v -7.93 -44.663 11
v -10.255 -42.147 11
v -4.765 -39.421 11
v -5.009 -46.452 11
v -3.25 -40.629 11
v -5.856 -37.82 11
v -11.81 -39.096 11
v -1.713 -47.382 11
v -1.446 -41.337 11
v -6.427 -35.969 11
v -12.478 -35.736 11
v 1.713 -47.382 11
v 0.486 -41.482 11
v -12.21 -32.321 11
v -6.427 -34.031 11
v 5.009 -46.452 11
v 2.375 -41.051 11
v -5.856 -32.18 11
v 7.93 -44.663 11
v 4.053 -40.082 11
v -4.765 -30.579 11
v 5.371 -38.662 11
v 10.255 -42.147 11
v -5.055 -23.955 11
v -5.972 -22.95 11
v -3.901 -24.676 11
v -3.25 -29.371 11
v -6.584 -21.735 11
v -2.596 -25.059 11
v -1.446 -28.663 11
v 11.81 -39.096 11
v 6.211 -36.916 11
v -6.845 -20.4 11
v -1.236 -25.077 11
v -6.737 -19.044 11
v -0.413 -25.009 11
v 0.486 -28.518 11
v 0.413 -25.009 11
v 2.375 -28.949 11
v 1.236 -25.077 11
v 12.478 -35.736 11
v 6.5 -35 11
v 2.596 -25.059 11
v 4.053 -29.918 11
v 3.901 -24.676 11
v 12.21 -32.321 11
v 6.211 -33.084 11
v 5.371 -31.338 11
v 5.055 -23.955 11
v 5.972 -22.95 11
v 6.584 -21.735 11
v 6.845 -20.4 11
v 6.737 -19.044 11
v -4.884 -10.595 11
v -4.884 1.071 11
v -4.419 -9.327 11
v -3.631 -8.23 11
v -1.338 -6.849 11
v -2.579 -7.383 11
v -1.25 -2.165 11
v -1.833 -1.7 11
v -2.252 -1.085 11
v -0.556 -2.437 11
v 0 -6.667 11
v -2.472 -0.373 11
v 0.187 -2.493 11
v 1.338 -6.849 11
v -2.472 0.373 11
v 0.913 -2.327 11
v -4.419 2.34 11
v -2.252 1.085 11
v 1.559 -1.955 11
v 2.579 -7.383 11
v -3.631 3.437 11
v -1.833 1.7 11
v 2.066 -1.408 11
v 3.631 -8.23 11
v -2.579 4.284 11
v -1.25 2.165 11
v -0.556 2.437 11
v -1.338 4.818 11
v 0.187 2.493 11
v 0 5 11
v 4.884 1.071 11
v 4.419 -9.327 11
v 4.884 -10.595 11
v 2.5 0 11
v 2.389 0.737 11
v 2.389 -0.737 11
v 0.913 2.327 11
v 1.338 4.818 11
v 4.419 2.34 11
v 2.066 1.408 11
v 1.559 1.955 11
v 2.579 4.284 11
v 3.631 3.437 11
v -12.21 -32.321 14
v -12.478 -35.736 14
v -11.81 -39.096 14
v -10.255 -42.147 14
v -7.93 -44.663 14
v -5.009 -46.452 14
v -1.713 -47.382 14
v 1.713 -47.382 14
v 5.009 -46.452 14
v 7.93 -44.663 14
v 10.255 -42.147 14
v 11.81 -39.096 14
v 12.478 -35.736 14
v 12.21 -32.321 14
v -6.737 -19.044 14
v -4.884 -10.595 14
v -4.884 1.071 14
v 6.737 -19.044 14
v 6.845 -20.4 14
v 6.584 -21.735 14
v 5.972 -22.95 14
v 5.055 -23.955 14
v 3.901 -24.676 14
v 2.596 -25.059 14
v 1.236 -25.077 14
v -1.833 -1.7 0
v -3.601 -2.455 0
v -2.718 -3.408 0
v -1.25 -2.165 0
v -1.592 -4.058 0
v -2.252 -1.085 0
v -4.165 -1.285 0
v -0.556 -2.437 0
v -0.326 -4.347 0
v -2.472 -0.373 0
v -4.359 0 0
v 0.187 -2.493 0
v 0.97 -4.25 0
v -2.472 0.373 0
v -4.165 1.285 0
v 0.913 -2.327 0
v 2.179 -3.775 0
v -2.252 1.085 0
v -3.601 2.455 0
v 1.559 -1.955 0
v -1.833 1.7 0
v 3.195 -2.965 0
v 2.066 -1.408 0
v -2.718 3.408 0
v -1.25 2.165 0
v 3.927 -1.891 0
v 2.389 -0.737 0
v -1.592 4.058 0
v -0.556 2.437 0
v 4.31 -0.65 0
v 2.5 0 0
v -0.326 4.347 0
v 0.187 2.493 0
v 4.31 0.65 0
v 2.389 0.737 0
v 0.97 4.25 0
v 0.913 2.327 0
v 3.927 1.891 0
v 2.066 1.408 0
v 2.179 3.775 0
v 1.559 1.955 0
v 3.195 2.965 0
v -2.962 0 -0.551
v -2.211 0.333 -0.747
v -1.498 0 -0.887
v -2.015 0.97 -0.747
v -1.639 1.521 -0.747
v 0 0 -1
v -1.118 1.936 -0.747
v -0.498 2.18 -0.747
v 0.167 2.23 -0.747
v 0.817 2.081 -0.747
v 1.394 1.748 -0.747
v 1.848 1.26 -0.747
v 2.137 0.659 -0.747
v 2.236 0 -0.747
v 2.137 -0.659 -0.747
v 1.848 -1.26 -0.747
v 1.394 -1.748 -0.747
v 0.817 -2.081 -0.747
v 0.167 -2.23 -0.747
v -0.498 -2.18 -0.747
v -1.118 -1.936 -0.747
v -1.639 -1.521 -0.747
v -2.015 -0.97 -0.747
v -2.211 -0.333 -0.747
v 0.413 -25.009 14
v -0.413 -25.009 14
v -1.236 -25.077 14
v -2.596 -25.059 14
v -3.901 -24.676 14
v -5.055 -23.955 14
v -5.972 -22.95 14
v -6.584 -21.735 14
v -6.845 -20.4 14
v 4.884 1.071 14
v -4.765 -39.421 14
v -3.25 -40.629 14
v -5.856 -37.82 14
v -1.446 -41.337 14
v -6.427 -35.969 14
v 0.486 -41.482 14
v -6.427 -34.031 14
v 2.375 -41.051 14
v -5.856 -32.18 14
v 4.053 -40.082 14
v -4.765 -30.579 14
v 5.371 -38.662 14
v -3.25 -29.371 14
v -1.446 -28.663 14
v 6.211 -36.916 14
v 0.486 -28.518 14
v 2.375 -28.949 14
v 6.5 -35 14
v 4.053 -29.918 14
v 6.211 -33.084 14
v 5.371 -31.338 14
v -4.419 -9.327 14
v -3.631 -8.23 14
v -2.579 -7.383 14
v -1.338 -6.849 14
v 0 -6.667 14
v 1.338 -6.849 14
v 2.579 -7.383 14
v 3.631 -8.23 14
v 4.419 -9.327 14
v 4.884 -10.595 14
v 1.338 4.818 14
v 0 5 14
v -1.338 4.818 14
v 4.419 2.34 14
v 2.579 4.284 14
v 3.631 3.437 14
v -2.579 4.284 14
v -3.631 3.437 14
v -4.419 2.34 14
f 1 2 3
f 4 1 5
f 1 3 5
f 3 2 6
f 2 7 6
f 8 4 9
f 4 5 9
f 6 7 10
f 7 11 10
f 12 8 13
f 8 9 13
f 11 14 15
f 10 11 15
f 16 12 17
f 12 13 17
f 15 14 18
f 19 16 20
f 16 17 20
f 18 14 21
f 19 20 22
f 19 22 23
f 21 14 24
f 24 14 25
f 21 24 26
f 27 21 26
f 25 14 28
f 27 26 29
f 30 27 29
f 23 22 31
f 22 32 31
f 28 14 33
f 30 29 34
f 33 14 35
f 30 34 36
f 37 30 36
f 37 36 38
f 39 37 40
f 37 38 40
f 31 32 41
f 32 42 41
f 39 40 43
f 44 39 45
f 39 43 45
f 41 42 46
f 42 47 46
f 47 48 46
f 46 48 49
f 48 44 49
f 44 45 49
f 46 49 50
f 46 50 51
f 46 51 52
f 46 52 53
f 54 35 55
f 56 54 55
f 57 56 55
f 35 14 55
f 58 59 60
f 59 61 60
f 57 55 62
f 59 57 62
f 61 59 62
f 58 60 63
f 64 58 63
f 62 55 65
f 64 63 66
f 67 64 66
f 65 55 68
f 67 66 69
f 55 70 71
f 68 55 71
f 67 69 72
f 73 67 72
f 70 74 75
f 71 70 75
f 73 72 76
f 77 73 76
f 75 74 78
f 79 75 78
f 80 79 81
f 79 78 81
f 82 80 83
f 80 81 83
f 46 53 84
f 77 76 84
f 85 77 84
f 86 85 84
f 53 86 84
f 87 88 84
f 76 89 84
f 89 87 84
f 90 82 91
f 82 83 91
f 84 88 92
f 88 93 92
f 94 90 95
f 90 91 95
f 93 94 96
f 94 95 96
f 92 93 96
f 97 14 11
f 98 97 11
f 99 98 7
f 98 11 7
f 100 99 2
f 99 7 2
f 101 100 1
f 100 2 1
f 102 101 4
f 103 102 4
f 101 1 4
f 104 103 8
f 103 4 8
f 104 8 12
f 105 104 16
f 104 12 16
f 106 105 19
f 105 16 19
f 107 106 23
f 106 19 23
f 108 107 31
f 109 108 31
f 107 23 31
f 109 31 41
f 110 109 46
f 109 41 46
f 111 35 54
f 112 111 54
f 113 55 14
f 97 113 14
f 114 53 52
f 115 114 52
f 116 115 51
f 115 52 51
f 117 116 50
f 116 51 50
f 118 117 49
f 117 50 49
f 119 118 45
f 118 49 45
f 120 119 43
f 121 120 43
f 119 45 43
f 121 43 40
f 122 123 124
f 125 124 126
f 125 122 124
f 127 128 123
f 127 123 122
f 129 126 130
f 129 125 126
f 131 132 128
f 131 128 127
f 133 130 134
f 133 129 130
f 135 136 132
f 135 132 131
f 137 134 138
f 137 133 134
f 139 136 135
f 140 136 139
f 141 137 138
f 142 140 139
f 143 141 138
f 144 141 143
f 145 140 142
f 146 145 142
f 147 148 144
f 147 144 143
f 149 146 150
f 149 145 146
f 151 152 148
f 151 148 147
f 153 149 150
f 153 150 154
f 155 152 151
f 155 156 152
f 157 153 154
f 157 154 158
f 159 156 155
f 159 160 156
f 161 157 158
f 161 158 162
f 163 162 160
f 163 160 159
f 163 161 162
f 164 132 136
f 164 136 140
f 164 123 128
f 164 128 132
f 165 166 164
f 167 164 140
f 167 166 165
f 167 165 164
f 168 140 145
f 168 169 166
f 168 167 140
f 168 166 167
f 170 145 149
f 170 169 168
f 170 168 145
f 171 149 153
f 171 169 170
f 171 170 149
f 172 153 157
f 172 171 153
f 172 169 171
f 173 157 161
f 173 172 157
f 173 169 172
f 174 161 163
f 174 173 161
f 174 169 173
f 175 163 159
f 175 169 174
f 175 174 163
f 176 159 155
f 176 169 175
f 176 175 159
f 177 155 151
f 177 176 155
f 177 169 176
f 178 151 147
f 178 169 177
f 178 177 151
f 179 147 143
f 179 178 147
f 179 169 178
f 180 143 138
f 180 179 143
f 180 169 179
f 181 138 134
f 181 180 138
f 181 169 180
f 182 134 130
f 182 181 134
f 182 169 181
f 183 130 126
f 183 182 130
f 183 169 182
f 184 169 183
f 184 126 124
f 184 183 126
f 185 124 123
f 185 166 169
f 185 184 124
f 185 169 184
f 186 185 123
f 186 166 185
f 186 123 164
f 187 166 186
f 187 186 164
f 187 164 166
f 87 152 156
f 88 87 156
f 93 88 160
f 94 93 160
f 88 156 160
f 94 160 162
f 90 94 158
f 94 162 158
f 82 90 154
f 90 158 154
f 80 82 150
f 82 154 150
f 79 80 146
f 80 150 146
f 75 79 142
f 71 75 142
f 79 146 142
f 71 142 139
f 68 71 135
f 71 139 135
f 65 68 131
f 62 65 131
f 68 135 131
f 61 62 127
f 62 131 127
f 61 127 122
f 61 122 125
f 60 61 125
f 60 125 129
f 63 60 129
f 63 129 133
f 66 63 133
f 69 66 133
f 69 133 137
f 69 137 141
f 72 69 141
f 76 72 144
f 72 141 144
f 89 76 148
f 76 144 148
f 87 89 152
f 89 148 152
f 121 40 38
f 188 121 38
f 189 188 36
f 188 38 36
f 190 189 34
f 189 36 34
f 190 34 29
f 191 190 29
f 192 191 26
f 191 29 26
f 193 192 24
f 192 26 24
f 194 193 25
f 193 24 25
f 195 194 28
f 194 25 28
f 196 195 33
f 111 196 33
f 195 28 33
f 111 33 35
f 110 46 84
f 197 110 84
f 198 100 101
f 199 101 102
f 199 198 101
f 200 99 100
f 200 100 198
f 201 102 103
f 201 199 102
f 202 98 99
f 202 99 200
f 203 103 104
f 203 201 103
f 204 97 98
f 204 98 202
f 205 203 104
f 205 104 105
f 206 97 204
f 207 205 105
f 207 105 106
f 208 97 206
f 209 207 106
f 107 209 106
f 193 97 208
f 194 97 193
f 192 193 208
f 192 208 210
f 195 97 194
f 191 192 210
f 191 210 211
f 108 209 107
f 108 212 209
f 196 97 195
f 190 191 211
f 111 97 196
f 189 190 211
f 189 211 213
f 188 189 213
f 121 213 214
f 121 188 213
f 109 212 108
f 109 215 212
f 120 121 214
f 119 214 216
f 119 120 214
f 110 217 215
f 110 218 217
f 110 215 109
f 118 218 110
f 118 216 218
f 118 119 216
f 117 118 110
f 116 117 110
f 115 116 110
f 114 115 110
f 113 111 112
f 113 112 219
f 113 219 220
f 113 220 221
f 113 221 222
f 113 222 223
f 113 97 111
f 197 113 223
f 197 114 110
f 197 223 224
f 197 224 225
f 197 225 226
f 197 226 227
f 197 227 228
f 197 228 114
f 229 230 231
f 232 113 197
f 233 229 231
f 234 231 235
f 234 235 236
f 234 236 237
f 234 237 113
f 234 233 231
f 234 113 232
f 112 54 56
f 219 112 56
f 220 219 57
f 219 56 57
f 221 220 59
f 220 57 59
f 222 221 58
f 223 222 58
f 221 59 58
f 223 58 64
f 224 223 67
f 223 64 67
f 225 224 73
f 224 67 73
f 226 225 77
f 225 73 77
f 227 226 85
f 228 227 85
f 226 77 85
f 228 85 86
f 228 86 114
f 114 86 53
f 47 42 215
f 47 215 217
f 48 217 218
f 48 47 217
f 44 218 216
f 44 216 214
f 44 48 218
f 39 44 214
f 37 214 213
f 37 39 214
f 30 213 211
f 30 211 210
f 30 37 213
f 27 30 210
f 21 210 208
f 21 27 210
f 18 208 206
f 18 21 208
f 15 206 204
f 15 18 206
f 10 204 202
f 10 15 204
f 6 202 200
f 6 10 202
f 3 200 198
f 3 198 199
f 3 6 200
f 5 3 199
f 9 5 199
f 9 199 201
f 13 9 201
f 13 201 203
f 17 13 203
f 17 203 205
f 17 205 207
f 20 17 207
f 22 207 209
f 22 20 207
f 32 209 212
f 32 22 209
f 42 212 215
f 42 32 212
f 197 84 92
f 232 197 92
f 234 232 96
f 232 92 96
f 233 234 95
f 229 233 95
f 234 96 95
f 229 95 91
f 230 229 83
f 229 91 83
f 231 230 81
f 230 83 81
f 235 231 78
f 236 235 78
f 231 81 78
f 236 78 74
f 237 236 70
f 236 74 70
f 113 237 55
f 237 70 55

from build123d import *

# Parameters (mm, degrees)
SKETCH_1_R      = 2.5
EXTRUDE_1_DEPTH = 11
EXTRUDE_2_DEPTH = 3
EXTRUDE_START   = -3
SKETCH_4_R      = 10
SKETCH_4_R_2    = 6.5
EXTRUDE_3_DEPTH = 3
FILLET_START    = 11
FILLET_1_DEPTH  = 3


with BuildPart() as part:
    # 草图1 → 凸台-拉伸1 (new body)
    with BuildSketch(Plane.XY):
        Circle(SKETCH_1_R)
    extrude(amount=EXTRUDE_1_DEPTH)

    # 草图2 → 旋转1 (revolve)
    with BuildSketch(Plane(origin=(0, 0, 0), x_dir=(1, 0, 0), z_dir=(0, 1, 0))):
        with BuildLine():
            Line((0, 0), (-4.358898944, 0))
            ThreePointArc((-4.358898944, 0), (-2.236067977, 0.746794345), (0, 1))
            Line((0, 1), (0, 0))
        make_face()
    revolve(axis=Axis((0, 0, 0), (0, 0, -1)))

    # 草图3 → 凸台-拉伸2 (add)
    with BuildSketch(Plane.XY.offset(11)):
        with BuildLine():
            Line((-4.883855118, 1.071428571), (-12.209637796, -32.321428571))
            ThreePointArc((-12.209637796, -32.321428571), (0, -47.5), (12.209637796, -32.321428571))
            Line((12.209637796, -32.321428571), (4.883855118, 1.071428571))
            ThreePointArc((4.883855118, 1.071428571), (0, 5), (-4.883855118, 1.071428571))
        make_face()
        with BuildLine():
            Line((-9.767710237, -32.857142857), (-4.883855118, -10.595238095))
            ThreePointArc((-4.883855118, -10.595238095), (0, -6.666666667), (4.883855118, -10.595238095))
            Line((4.883855118, -10.595238095), (9.767710237, -32.857142857))
            ThreePointArc((9.767710237, -32.857142857), (0, -45), (-9.767710237, -32.857142857))
        make_face(mode=Mode.SUBTRACT)
    extrude(amount=EXTRUDE_2_DEPTH)

    # 草图4 → 凸台-拉伸3 (add)
    with BuildSketch(Plane.XY.offset(14).offset(EXTRUDE_START)):
        with Locations((0, -35)):
            Circle(SKETCH_4_R)
        with Locations((0, -35)):
            Circle(SKETCH_4_R_2, mode=Mode.SUBTRACT)
    extrude(amount=EXTRUDE_3_DEPTH)

    # 圆角1: read off the stored shape, not the designer's step
    # 圆角1 outline → 圆角1 (add)
    with BuildSketch(Plane.XY.offset(FILLET_START)):
        with BuildLine():
            ThreePointArc((6.737252603, -19.043514567), (5.547910317, -23.48400457), (1.235598323, -25.076628759))
            ThreePointArc((1.235598323, -25.076628759), (6.738122863, -27.610974335), (9.767710237, -32.857142857))
            Line((9.767710237, -32.857142857), (6.737252603, -19.043514567))
        make_face()
        with BuildLine():
            ThreePointArc((-9.767710237, -32.857142857), (-6.738122863, -27.610974335), (-1.235598323, -25.076628759))
            ThreePointArc((-1.235598323, -25.076628759), (-5.547910317, -23.48400457), (-6.737252603, -19.043514567))
            Line((-6.737252603, -19.043514567), (-9.767710237, -32.857142857))
        make_face()
    extrude(amount=FILLET_1_DEPTH)


solid = part.part
